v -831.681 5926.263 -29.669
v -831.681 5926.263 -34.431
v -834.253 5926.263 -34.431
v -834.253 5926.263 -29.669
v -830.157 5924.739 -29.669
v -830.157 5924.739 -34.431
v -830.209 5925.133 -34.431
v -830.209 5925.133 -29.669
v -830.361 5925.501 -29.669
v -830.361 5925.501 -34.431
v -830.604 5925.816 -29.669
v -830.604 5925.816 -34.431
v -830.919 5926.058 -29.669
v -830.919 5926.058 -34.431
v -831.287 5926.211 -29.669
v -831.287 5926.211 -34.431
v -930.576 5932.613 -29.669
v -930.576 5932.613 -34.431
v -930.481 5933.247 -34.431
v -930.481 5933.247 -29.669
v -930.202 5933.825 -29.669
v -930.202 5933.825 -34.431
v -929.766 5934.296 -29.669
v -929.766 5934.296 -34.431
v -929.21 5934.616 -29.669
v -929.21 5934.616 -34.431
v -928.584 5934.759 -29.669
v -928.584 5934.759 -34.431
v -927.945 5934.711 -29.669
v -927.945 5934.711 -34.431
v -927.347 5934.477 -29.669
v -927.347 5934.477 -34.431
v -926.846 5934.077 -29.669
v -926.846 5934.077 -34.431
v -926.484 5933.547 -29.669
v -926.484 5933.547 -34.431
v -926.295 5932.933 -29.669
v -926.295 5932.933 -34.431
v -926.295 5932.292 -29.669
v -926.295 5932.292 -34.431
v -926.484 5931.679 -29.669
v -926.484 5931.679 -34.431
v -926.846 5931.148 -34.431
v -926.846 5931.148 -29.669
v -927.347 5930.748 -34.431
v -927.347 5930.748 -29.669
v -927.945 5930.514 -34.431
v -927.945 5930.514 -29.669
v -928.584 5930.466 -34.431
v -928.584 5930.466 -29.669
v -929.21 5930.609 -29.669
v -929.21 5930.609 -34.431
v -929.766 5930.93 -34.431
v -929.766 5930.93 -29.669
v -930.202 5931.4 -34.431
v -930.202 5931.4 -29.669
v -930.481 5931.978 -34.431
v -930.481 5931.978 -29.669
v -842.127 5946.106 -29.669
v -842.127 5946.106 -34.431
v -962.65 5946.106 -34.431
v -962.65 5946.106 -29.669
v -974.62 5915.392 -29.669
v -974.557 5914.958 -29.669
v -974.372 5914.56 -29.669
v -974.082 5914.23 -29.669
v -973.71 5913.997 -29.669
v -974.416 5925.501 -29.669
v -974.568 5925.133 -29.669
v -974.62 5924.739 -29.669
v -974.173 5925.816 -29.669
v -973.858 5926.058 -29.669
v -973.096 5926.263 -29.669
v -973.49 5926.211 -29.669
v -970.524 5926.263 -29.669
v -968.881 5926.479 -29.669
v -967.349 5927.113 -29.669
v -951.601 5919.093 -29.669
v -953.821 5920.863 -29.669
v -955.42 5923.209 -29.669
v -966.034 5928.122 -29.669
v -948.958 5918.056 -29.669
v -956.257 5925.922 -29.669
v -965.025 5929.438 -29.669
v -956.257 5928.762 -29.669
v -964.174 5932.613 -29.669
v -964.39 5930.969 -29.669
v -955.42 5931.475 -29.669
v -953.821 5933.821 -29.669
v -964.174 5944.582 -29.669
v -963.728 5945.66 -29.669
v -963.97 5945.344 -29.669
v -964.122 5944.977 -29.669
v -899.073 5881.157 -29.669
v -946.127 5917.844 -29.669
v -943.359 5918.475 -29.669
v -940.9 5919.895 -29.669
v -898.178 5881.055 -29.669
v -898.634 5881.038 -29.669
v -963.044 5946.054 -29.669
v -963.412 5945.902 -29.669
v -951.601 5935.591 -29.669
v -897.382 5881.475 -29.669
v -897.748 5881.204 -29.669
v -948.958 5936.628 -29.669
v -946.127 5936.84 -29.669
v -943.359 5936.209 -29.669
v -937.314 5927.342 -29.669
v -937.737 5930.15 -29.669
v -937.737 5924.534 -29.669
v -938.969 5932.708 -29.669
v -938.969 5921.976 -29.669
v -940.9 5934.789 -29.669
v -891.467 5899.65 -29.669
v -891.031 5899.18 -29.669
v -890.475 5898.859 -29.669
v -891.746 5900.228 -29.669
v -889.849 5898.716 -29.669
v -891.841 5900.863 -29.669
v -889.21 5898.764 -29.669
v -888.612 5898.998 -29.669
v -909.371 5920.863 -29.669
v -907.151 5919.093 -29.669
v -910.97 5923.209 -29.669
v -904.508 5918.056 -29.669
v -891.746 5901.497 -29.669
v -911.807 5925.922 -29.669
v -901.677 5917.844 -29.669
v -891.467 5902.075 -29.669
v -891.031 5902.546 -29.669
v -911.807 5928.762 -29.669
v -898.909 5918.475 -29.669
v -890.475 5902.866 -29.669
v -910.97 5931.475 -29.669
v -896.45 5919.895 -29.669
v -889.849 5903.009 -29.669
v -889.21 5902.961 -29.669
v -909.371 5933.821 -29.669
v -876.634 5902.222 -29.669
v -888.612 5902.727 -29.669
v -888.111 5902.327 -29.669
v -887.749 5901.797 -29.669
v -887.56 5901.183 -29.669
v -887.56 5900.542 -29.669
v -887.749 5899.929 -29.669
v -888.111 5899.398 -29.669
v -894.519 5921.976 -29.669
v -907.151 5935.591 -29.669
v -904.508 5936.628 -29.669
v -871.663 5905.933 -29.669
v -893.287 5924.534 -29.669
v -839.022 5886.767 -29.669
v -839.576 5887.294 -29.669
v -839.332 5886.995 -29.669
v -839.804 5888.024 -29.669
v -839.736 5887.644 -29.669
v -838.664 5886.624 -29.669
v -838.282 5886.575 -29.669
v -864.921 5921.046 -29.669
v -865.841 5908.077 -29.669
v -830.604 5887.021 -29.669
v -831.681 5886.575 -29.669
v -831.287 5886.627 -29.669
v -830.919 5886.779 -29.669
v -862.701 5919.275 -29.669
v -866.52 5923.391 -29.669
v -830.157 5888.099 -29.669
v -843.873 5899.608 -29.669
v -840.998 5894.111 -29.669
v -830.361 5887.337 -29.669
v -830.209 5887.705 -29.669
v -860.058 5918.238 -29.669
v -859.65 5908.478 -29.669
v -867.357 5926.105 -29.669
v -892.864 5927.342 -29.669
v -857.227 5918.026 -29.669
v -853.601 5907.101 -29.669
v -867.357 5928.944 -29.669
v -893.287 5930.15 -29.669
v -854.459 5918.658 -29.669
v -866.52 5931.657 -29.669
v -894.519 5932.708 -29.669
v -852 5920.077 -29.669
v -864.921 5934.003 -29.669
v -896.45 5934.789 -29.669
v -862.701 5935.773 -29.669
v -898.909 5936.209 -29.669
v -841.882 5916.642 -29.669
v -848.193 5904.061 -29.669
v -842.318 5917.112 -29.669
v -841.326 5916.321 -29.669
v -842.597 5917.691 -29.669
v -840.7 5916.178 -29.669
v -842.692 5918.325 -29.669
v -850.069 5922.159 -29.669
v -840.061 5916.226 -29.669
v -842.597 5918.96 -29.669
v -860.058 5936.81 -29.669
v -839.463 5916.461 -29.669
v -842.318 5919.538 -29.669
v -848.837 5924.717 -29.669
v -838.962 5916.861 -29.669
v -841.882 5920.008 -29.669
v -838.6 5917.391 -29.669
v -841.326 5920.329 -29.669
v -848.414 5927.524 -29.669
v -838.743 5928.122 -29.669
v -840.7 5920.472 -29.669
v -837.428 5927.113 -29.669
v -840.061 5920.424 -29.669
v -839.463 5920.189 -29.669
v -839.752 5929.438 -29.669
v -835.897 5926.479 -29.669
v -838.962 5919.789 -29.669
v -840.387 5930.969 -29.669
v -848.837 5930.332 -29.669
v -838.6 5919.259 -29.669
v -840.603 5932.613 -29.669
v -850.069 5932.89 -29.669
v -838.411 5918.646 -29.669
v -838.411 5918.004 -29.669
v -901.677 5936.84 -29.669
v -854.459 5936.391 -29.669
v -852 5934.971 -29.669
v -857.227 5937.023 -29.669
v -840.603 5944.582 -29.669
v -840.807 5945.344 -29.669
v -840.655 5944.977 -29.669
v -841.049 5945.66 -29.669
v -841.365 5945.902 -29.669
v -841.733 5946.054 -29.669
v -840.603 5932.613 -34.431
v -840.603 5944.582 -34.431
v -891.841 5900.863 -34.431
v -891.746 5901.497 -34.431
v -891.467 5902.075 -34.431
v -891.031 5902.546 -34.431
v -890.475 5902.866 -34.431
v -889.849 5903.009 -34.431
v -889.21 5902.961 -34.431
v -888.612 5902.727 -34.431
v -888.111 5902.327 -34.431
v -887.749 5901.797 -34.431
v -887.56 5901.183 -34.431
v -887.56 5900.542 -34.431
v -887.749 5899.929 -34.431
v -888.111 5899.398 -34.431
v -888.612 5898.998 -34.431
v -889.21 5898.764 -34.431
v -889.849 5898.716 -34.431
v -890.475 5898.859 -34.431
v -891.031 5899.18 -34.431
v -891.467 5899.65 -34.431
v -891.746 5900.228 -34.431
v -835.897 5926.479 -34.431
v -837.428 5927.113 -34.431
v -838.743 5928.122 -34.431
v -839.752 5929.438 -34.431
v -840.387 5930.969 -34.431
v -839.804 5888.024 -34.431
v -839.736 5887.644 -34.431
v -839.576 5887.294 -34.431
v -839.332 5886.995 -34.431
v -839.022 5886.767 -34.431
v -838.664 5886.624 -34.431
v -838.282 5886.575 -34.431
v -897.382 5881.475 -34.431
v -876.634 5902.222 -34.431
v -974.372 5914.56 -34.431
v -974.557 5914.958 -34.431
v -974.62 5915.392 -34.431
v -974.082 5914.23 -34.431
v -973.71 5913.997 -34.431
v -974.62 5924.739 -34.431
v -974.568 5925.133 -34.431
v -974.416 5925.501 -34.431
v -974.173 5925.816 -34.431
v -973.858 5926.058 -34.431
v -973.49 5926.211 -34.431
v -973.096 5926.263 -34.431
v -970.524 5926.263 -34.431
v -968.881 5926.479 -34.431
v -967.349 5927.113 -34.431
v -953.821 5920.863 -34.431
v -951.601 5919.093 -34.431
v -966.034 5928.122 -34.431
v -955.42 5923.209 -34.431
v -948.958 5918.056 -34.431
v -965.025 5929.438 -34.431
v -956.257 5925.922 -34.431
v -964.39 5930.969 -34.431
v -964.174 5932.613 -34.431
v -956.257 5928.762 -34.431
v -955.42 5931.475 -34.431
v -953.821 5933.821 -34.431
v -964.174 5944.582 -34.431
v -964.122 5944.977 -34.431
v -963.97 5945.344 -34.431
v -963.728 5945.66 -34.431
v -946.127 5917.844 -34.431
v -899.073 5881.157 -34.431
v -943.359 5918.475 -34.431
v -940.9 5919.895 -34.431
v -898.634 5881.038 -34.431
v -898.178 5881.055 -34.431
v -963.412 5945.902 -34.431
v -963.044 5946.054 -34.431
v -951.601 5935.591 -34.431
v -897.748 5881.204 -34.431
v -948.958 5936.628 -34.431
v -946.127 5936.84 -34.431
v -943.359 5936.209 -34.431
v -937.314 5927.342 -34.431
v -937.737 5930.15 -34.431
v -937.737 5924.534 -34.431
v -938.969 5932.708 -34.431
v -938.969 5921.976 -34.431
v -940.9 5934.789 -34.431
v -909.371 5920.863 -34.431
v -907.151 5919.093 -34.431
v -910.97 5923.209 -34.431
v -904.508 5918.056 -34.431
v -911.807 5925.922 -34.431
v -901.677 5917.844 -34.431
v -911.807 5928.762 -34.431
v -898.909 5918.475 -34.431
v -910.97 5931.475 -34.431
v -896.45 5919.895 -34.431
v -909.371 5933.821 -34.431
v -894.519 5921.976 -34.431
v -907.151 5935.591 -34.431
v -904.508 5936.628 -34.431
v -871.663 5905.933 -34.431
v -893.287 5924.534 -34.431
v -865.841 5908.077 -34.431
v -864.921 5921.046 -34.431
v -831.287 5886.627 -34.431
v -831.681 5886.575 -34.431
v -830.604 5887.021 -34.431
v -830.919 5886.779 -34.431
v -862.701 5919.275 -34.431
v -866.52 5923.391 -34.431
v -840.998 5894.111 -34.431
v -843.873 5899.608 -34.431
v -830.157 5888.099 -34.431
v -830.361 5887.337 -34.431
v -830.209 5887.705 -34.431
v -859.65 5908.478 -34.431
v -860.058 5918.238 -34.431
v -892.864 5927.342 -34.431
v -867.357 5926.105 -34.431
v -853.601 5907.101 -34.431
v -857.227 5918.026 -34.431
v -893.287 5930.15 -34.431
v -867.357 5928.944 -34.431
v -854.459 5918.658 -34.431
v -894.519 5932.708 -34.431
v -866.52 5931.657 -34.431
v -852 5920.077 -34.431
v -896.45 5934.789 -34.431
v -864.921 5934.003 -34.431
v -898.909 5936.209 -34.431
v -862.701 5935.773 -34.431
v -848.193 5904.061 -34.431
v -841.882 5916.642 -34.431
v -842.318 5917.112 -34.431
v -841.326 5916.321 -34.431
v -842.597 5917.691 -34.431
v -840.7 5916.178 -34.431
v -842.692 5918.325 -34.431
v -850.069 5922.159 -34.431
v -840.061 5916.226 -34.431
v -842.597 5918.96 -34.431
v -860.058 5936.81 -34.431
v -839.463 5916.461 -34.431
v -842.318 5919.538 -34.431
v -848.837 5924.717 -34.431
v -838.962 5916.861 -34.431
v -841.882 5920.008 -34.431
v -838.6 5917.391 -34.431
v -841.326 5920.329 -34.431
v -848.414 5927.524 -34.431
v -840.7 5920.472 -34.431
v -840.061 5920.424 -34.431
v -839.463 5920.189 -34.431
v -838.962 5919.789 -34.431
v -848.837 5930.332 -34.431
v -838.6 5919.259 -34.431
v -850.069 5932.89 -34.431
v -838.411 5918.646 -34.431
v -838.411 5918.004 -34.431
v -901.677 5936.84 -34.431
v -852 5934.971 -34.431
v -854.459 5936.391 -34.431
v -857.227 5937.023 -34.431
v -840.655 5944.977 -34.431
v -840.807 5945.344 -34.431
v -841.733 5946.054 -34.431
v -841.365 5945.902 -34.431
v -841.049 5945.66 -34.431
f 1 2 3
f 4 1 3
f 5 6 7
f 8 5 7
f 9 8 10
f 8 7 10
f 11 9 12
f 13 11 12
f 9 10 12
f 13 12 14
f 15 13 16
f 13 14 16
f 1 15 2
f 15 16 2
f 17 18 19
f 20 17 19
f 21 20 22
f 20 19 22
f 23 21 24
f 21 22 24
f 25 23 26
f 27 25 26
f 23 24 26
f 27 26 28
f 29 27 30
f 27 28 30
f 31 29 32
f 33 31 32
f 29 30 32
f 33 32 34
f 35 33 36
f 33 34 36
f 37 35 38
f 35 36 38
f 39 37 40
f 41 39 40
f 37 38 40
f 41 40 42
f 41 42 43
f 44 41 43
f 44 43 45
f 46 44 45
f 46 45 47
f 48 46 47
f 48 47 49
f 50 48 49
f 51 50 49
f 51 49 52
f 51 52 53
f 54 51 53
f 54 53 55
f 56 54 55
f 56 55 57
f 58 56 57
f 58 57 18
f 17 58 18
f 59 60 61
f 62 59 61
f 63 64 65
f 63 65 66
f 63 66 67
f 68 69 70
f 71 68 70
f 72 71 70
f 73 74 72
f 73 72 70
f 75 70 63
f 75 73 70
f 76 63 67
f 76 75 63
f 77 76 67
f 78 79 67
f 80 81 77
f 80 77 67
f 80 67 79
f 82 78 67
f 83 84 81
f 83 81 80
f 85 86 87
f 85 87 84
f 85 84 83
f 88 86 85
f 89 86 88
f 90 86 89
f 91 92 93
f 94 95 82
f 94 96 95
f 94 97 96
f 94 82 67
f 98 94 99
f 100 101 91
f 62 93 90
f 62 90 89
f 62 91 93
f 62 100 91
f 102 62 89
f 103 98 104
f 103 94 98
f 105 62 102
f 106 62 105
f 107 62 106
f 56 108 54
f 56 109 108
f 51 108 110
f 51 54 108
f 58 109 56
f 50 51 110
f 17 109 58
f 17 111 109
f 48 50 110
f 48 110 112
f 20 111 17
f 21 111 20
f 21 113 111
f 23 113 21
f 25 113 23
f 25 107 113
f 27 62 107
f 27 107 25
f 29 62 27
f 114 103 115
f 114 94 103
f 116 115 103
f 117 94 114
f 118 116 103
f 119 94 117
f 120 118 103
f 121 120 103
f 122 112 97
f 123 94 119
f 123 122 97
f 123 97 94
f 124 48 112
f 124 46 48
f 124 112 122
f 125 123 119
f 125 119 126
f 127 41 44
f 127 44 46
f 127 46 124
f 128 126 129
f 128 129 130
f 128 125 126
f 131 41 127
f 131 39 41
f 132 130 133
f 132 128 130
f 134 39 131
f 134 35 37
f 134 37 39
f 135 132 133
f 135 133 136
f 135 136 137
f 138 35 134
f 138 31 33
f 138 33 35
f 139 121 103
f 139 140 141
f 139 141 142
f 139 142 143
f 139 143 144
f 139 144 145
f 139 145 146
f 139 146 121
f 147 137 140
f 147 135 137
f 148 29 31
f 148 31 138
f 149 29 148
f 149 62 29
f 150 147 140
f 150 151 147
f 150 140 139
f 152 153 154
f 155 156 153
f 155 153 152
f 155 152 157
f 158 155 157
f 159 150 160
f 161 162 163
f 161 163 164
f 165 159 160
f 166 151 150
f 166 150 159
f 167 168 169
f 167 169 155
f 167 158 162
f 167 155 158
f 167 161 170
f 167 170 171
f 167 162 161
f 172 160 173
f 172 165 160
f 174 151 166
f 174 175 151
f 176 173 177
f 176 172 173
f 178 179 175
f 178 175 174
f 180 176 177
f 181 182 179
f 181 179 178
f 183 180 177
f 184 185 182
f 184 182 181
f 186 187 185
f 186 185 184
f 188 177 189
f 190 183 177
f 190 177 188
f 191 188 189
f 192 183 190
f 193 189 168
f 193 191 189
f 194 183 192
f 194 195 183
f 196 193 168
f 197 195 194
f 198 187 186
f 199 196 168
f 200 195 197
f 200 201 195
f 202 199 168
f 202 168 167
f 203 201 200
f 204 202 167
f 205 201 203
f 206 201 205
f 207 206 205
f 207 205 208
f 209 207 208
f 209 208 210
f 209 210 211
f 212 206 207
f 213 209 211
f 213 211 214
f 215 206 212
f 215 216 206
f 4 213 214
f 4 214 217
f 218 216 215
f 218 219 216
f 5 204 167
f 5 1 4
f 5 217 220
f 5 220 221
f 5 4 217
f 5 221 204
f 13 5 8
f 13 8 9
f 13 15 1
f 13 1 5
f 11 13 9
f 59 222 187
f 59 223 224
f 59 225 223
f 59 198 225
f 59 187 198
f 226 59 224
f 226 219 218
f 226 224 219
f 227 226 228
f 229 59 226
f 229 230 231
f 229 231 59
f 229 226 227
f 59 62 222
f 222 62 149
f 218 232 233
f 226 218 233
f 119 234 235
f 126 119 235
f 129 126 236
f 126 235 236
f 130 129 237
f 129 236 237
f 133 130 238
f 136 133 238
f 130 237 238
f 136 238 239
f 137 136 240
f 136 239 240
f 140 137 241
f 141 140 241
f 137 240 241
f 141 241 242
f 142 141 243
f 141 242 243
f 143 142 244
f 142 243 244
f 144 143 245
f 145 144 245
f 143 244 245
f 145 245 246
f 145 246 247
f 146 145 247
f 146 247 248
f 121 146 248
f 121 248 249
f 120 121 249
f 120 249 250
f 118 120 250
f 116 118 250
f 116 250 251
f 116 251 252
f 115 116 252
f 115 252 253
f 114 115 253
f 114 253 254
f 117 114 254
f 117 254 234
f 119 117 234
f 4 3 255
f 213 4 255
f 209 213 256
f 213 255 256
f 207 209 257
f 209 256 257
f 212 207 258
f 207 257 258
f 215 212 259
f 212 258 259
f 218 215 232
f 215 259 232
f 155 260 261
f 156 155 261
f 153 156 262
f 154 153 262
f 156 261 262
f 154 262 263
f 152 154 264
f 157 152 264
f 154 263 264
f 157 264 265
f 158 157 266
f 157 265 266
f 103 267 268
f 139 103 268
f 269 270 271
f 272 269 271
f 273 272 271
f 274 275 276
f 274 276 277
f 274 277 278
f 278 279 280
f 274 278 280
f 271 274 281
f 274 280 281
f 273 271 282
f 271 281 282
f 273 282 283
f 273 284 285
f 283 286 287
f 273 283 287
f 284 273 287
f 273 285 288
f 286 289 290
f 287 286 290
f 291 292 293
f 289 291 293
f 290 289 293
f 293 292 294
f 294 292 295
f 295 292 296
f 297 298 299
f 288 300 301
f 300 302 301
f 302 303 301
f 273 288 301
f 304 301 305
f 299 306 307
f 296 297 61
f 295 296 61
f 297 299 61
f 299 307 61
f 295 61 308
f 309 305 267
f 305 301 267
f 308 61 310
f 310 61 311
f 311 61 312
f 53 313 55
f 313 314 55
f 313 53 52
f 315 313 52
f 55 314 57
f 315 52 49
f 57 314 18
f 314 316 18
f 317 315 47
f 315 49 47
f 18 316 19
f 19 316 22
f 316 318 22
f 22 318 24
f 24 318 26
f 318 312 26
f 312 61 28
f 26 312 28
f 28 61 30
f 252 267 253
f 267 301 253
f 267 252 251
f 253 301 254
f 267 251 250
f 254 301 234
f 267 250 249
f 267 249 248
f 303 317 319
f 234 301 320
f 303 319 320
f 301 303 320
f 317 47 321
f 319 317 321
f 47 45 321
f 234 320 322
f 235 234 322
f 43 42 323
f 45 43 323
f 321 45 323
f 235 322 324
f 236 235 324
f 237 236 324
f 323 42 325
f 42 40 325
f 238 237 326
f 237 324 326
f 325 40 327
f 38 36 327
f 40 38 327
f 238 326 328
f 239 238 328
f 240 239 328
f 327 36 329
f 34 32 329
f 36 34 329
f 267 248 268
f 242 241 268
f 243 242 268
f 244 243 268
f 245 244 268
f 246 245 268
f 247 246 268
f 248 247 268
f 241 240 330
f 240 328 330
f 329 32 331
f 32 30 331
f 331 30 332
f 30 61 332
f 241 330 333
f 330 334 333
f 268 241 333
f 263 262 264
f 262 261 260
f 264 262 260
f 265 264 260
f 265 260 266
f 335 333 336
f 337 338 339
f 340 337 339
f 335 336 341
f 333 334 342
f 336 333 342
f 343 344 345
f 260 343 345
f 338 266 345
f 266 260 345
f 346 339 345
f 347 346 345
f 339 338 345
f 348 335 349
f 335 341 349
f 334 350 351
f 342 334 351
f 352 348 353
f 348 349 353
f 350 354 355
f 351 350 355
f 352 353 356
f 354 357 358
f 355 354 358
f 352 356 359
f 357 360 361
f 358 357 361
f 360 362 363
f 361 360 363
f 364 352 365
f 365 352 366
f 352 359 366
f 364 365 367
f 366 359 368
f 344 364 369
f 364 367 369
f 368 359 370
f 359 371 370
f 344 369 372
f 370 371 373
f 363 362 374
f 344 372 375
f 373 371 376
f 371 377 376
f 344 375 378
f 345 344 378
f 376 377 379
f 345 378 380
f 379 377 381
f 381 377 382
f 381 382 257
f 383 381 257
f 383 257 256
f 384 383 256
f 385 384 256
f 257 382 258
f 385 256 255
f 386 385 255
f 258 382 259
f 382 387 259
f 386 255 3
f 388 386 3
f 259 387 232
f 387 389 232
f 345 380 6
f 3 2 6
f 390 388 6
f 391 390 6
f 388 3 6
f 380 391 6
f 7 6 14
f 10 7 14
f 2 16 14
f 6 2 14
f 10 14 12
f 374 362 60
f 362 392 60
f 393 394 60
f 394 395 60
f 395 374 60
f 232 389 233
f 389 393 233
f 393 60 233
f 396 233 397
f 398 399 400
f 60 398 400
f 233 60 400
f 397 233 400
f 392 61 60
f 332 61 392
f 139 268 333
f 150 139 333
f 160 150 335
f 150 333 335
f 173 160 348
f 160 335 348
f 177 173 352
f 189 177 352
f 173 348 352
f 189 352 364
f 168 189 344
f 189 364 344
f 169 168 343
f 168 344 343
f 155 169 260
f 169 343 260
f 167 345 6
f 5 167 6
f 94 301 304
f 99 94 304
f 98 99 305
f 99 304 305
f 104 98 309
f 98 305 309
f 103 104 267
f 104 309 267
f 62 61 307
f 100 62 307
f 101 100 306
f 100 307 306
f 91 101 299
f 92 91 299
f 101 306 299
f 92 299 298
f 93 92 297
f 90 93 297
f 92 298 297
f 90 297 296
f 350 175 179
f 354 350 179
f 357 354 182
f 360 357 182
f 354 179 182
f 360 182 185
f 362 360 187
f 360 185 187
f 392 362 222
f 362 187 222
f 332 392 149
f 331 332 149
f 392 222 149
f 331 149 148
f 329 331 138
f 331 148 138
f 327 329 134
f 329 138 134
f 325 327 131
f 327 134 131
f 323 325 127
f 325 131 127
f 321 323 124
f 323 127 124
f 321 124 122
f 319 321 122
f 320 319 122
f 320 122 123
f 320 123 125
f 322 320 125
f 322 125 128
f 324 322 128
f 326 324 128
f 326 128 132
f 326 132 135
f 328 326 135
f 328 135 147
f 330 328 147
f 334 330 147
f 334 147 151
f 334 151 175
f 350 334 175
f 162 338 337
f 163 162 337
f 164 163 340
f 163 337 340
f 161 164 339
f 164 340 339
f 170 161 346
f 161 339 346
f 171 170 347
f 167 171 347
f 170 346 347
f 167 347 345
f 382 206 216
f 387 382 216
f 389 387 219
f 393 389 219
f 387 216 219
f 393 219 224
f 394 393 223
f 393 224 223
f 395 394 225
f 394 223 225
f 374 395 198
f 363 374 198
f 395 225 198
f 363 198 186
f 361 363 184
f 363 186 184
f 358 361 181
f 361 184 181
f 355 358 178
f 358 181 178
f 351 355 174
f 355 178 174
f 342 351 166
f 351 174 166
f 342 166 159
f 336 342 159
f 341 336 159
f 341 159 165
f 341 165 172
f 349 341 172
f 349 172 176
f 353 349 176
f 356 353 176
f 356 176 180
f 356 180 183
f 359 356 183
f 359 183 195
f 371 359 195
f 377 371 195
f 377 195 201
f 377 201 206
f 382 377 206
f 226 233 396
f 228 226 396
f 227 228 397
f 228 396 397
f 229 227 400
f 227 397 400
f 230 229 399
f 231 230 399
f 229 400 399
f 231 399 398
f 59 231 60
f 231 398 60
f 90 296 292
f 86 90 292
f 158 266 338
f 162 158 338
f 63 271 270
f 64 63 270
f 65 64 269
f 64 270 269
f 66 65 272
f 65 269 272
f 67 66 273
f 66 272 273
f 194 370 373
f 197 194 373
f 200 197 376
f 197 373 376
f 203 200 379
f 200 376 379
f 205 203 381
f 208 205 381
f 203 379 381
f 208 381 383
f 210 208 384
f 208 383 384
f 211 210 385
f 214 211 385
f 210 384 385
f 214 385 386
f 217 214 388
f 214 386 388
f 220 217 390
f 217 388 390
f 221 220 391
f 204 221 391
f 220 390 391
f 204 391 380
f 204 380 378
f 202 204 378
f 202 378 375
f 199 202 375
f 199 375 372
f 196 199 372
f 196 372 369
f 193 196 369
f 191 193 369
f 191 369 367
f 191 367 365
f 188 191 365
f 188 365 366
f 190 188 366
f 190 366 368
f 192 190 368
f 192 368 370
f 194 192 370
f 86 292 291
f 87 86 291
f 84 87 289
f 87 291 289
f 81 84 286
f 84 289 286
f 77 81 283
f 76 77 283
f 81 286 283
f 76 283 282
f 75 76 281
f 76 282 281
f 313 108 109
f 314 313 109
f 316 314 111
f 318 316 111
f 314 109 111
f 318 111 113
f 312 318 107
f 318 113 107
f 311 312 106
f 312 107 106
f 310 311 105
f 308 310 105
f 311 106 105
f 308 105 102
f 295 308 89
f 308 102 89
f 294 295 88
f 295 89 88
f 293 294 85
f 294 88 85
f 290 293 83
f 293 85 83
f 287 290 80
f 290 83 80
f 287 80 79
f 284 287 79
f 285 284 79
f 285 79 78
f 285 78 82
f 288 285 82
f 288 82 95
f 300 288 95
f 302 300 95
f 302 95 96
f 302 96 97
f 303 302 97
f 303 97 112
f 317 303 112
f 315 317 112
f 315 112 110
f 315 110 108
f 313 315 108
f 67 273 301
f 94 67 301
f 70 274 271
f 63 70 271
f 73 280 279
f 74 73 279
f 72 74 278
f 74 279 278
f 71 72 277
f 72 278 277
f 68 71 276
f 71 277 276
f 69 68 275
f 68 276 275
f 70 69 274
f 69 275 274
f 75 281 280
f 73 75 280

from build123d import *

# Parameters (mm, degrees)
BOSS_EXTRUDE1_DEPTH   = 4.7625
F_6_CLEARANCE_HOLE1_D = 4.3053
SKETCH5_R             = 9.525
CUT_EXTRUDE1_DEPTH    = 5.7625


with BuildPart() as part:
    # Sketch1 → Boss-Extrude1 (new body)
    with BuildSketch(Plane.XY.offset(-34.431186078)):
        with BuildLine():
            Line((-842.127056947, 5946.106287623), (-962.650056947, 5946.106287623))
            ThreePointArc((-962.650056947, 5946.106287623), (-963.727687681, 5945.659918357), (-964.174056947, 5944.582287623))
            Line((-964.174056947, 5944.582287623), (-964.174056947, 5932.612537623))
            ThreePointArc((-964.174056947, 5932.612537623), (-966.033928886, 5928.122409562), (-970.524056947, 5926.262537623))
            Line((-970.524056947, 5926.262537623), (-973.095806947, 5926.262537623))
            ThreePointArc((-973.095806947, 5926.262537623), (-974.173437681, 5925.816168357), (-974.619806947, 5924.738537623))
            Line((-974.619806947, 5924.738537623), (-974.619806947, 5915.392415905))
            ThreePointArc((-974.619806947, 5915.392415905), (-974.372123334, 5914.559593907), (-973.709580595, 5913.997475796))
            Line((-973.709580595, 5913.997475796), (-899.073125038, 5881.157435351))
            ThreePointArc((-899.073125038, 5881.157435351), (-898.178349327, 5881.054505693), (-897.381720655, 5881.474744726))
            Line((-897.381720655, 5881.474744726), (-876.633992352, 5902.222473029))
            ThreePointArc((-876.633992352, 5902.222473029), (-853.601284124, 5907.100841083), (-839.803970731, 5888.023674985))
            ThreePointArc((-839.803970731, 5888.023674985), (-839.332483448, 5886.99508367), (-838.281835234, 5886.575037623))
            Line((-838.281835234, 5886.575037623), (-831.681306947, 5886.575037623))
            ThreePointArc((-831.681306947, 5886.575037623), (-830.603676212, 5887.021406888), (-830.157306947, 5888.099037623))
            Line((-830.157306947, 5888.099037623), (-830.157306947, 5924.738537623))
            ThreePointArc((-830.157306947, 5924.738537623), (-830.603676212, 5925.816168357), (-831.681306947, 5926.262537623))
            Line((-831.681306947, 5926.262537623), (-834.253056947, 5926.262537623))
            ThreePointArc((-834.253056947, 5926.262537623), (-838.743185007, 5928.122409562), (-840.603056947, 5932.612537623))
            Line((-840.603056947, 5932.612537623), (-840.603056947, 5944.582287623))
            ThreePointArc((-840.603056947, 5944.582287623), (-841.049426212, 5945.659918357), (-842.127056947, 5946.106287623))
        make_face()
    extrude(amount=BOSS_EXTRUDE1_DEPTH)

    # #6 Clearance Hole1 (through all)
    with Locations(Plane.XY.offset(-29.668686078)):
        with Locations((-840.539556947, 5918.325037623), (-889.688556947, 5900.862537623), (-928.423556947, 5932.612537623)):
            Hole(F_6_CLEARANCE_HOLE1_D / 2)

    # Sketch5 → Cut-Extrude1 (cut, through all)
    with BuildSketch(Plane.XY.offset(-29.668686078)):
        with Locations((-857.938556947, 5927.524153596)):
            Circle(SKETCH5_R)
        with Locations((-902.388556947, 5927.342037623)):
            Circle(SKETCH5_R)
        with Locations((-946.838556947, 5927.342037623)):
            Circle(SKETCH5_R)
    extrude(amount=-CUT_EXTRUDE1_DEPTH, mode=Mode.SUBTRACT)


solid = part.part
